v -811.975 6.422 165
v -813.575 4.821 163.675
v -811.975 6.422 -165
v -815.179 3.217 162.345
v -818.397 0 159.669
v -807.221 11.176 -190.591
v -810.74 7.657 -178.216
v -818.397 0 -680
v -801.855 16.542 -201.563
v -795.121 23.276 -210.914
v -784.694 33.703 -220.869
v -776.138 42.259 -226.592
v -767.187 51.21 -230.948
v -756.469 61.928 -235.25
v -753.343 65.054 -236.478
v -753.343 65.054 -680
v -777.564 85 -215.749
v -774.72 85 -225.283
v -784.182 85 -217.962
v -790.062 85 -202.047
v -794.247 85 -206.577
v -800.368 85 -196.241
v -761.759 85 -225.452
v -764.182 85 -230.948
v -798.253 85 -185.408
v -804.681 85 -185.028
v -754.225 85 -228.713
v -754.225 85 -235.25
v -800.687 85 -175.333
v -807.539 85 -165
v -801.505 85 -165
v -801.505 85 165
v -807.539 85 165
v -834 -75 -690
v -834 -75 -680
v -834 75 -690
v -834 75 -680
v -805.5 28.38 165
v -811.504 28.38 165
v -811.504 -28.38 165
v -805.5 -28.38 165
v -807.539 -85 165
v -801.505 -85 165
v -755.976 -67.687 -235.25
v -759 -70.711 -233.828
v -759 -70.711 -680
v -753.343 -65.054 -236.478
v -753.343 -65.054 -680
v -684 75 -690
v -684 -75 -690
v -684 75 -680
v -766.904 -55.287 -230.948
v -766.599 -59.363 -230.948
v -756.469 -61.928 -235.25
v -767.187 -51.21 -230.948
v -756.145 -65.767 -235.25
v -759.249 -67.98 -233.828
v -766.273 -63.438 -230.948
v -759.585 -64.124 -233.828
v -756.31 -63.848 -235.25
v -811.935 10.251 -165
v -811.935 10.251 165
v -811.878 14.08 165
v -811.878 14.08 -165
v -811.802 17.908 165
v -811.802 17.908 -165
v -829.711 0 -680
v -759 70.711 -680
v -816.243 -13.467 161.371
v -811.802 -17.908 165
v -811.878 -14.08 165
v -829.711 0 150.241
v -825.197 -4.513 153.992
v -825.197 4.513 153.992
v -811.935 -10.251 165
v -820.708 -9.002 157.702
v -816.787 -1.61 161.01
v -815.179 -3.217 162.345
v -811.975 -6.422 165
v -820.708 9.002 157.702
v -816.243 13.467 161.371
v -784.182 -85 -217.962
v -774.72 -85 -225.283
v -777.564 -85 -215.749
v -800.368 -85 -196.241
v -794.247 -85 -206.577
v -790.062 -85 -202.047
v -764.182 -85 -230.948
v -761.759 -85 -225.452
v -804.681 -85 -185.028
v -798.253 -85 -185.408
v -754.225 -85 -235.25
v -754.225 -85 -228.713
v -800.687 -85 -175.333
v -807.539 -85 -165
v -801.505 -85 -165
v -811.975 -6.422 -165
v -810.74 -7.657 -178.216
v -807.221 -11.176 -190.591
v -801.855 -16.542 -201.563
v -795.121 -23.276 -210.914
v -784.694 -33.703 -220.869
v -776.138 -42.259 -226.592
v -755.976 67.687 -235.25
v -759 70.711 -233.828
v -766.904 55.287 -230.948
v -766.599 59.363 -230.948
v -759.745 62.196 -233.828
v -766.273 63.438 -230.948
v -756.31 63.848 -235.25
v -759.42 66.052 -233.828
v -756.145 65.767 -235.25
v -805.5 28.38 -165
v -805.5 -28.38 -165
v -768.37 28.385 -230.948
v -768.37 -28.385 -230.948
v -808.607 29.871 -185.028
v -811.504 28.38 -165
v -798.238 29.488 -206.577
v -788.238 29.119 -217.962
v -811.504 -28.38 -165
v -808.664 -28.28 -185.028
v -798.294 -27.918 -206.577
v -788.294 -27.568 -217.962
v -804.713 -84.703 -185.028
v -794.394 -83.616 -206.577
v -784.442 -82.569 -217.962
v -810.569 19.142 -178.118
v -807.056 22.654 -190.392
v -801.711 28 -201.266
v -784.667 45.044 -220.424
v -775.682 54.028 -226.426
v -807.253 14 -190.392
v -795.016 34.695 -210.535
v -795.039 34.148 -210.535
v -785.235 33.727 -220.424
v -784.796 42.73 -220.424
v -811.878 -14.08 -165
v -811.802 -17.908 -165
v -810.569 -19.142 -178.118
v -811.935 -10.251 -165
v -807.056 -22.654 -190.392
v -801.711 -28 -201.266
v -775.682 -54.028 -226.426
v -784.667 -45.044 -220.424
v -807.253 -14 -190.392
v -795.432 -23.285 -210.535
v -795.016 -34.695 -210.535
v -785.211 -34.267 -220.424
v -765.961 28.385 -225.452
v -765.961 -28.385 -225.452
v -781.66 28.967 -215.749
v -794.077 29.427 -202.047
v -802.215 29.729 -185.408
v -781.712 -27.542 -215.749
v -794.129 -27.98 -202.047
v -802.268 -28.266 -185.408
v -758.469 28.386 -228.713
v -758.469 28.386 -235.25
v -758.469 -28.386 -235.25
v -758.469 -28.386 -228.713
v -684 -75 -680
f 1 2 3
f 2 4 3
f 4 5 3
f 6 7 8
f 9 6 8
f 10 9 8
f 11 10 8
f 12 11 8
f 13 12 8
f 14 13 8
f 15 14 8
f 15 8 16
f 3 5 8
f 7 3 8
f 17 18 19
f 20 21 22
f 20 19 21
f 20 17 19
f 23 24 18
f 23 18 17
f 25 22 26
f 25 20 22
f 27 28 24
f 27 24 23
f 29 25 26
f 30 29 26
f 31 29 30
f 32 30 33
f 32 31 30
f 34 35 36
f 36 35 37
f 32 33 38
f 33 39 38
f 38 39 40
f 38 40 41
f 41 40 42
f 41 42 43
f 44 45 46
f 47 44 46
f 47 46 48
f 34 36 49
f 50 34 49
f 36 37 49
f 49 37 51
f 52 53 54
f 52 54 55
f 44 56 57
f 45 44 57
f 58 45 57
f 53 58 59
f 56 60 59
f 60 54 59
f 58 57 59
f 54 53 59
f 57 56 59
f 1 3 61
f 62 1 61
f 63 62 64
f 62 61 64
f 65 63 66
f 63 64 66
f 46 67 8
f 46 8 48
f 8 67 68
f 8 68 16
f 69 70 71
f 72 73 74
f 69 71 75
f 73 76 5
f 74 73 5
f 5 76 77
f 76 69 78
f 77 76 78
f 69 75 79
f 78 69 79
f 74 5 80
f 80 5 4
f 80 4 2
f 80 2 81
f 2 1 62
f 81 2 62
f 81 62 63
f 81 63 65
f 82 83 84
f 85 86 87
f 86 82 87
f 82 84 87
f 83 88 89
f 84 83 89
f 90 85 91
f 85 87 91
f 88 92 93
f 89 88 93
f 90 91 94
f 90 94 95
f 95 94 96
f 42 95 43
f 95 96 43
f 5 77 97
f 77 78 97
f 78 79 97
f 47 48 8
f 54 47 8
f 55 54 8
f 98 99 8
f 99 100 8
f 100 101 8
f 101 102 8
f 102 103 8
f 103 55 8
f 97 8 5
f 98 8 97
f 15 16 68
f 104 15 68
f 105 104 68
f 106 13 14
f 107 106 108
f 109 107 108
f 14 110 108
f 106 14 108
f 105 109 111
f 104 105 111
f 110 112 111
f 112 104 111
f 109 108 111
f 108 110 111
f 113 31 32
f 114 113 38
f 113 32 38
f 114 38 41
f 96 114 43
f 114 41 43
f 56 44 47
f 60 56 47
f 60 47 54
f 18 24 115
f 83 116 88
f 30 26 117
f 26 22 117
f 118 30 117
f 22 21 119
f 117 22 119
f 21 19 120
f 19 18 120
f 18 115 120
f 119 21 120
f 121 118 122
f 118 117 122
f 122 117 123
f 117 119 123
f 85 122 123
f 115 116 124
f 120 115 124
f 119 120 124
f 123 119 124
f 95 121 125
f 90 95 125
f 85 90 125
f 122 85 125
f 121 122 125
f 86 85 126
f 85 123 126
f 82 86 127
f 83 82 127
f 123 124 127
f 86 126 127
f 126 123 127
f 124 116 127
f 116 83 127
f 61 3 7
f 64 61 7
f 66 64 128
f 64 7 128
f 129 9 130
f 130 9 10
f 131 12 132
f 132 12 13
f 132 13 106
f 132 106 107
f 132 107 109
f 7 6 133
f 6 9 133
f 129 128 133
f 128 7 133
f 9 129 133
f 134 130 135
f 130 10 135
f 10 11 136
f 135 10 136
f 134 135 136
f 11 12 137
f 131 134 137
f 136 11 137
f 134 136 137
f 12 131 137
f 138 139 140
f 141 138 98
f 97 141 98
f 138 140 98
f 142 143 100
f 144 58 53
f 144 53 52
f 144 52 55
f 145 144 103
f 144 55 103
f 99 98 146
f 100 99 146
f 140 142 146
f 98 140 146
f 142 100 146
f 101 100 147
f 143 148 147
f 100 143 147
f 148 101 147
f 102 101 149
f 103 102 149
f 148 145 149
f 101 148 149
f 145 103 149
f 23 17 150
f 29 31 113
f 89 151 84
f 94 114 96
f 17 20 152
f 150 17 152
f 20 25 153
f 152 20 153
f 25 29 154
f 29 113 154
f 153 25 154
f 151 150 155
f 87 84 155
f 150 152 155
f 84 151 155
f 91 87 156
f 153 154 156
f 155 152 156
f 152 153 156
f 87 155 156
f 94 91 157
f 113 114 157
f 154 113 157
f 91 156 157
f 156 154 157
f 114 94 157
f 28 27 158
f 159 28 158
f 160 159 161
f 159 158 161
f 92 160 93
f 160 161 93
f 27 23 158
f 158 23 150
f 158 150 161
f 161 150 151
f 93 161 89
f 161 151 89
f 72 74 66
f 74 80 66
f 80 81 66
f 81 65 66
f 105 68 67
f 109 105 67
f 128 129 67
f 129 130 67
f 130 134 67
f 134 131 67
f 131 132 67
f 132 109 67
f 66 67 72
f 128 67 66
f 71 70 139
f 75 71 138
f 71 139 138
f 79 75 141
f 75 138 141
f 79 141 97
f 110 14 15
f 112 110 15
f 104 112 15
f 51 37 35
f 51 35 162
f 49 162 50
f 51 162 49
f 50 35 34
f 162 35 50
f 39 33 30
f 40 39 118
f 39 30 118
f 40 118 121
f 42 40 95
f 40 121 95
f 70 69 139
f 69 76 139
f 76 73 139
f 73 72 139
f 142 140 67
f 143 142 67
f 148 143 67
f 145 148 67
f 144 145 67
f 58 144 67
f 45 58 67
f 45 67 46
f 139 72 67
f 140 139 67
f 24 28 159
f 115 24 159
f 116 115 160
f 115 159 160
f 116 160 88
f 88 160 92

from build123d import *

# Parameters (mm, degrees)
F1_ANGLE_BACK = 15
F1_ANGLE      = 30
F2_W          = 610.7713580132
F2_H          = 748.7817406654
F2_W_2        = 170
F2_H_2        = 405
F3_DEPTH      = 812.0010001
F6_DEPTH      = 845
F5_W          = 150
F5_H          = 150
F7_DEPTH      = 10


with BuildPart() as f1:
    # F0 (on Front) → F1 (revolve)
    with BuildSketch(Plane.XZ, mode=Mode.PRIVATE) as f1_sk:
        with BuildLine():
            ThreePointArc((-759, -228.7132619749), (-762.7450404957, -227.0866981656), (-766.4865952329, -225.4521320796))
            ThreePointArc((-766.4865952329, -225.4521320796), (-795.2454309666, -201.1101420284), (-806, -165))
            Line((-806, -165), (-806, 165))
            Line((-806, 165), (-812, 165))
            Line((-812, 165), (-812, -165))
            ThreePointArc((-812, -165), (-800.2677428727, -204.3928822129), (-768.8944675268, -230.9477804505))
            ThreePointArc((-768.8944675268, -230.9477804505), (-763.9502619939, -233.1057510397), (-759, -235.2497919923))
            Line((-759, -235.2497919923), (-759, -228.713261975))
        make_face()
    revolve(f1_sk.sketch.rotate(Axis((0, 0, -82.5), (0, 0, 1)), -F1_ANGLE_BACK), axis=Axis((0, 0, -82.5), (0, 0, 1)), revolution_arc=F1_ANGLE)

    # F2 (on Right) → F3 (cut, through all)
    with BuildSketch(Plane.YZ):
        Rectangle(F2_W, F2_H)
        with Locations((0, -37.5)):
            Rectangle(F2_W_2, F2_H_2, mode=Mode.SUBTRACT)
    extrude(amount=-F3_DEPTH, mode=Mode.SUBTRACT)


with BuildPart() as f6:
    # F5 (on offset) → F6 (new body)
    with BuildSketch(Plane.XY.offset(-680)):
        Polygon((-759, 70.7106781187), (-829.7106781187, 0), (-759, -70.7106781187), (-753.3431457505, -65.0538238692), (-818.3969696197, 0), (-753.3431457505, 65.0538238692), align=None)
    extrude(amount=F6_DEPTH)

    # F0 (on Front) → F8 (revolve, cut)
    with BuildSketch(Plane.XZ):
        with BuildLine():
            ThreePointArc((-806, -165), (-795.2454309666, -201.1101420284), (-766.4865952329, -225.4521320796))
            ThreePointArc((-766.4865952329, -225.4521320796), (-762.7450404957, -227.0866981656), (-759, -228.7132619749))
            Line((-759, -228.713261975), (-759, 165))
            Line((-759, 165), (-806, 165))
            Line((-806, 165), (-806, -165))
        make_face()
        with BuildLine():
            ThreePointArc((-759, -228.7132619749), (-762.7450404957, -227.0866981656), (-766.4865952329, -225.4521320796))
            ThreePointArc((-766.4865952329, -225.4521320796), (-795.2454309666, -201.1101420284), (-806, -165))
            Line((-806, -165), (-806, 165))
            Line((-806, 165), (-812, 165))
            Line((-812, 165), (-812, -165))
            ThreePointArc((-812, -165), (-800.2677428727, -204.3928822129), (-768.8944675268, -230.9477804505))
            ThreePointArc((-768.8944675268, -230.9477804505), (-763.9502619939, -233.1057510397), (-759, -235.2497919923))
            Line((-759, -235.2497919923), (-759, -228.713261975))
        make_face()
        with BuildLine():
            Line((-759, 165), (-759, -228.713261975))
            ThreePointArc((-759, -228.7132619749), (-734.5550951922, -239.0980108337), (-709.968149662, -249.141839258))
            Line((-709.968149662, -249.141839258), (-709.968149662, -235.2497919923))
            Line((-709.968149662, -235.2497919923), (-709.968149662, 165))
            Line((-709.968149662, 165), (-759, 165))
        make_face()
        with BuildLine():
            ThreePointArc((-709.968149662, -249.141839258), (-734.5550951922, -239.0980108337), (-759, -228.7132619749))
            Line((-759, -228.713261975), (-759, -235.2497919923))
            ThreePointArc((-759, -235.2497919923), (-734.5545744528, -245.5963972216), (-709.968149662, -255.6033341136))
            Line((-709.968149662, -255.6033341136), (-709.968149662, -249.141839258))
        make_face()
    revolve(axis=Axis((0, 0, -272.5), (0, 0, -1)), mode=Mode.SUBTRACT)

    # F0 (on Front) → F9 (revolve, cut)
    with BuildSketch(Plane.XZ):
        Polygon((-842, 140), (-812, 165), (-842, 165), align=None)
    revolve(axis=Axis((0, 0, -272.5), (0, 0, -1)), mode=Mode.SUBTRACT)


with BuildPart() as f7:
    # F5 (on offset) → F7 (new body)
    with BuildSketch(Plane.XY.offset(-680)):
        with Locations((-759, 0)):
            Rectangle(F5_W, F5_H)
        Polygon((-759, -70.7106781187), (-829.7106781187, 0), (-759, 70.7106781187), (-753.3431457505, 65.0538238692), (-818.3969696197, 0), (-753.3431457505, -65.0538238692), align=None, mode=Mode.SUBTRACT)
        Polygon((-759, 70.7106781187), (-829.7106781187, 0), (-759, -70.7106781187), (-753.3431457505, -65.0538238692), (-818.3969696197, 0), (-753.3431457505, 65.0538238692), align=None)
    extrude(amount=-F7_DEPTH)


solid = Compound([f1.part, f6.part, f7.part])
